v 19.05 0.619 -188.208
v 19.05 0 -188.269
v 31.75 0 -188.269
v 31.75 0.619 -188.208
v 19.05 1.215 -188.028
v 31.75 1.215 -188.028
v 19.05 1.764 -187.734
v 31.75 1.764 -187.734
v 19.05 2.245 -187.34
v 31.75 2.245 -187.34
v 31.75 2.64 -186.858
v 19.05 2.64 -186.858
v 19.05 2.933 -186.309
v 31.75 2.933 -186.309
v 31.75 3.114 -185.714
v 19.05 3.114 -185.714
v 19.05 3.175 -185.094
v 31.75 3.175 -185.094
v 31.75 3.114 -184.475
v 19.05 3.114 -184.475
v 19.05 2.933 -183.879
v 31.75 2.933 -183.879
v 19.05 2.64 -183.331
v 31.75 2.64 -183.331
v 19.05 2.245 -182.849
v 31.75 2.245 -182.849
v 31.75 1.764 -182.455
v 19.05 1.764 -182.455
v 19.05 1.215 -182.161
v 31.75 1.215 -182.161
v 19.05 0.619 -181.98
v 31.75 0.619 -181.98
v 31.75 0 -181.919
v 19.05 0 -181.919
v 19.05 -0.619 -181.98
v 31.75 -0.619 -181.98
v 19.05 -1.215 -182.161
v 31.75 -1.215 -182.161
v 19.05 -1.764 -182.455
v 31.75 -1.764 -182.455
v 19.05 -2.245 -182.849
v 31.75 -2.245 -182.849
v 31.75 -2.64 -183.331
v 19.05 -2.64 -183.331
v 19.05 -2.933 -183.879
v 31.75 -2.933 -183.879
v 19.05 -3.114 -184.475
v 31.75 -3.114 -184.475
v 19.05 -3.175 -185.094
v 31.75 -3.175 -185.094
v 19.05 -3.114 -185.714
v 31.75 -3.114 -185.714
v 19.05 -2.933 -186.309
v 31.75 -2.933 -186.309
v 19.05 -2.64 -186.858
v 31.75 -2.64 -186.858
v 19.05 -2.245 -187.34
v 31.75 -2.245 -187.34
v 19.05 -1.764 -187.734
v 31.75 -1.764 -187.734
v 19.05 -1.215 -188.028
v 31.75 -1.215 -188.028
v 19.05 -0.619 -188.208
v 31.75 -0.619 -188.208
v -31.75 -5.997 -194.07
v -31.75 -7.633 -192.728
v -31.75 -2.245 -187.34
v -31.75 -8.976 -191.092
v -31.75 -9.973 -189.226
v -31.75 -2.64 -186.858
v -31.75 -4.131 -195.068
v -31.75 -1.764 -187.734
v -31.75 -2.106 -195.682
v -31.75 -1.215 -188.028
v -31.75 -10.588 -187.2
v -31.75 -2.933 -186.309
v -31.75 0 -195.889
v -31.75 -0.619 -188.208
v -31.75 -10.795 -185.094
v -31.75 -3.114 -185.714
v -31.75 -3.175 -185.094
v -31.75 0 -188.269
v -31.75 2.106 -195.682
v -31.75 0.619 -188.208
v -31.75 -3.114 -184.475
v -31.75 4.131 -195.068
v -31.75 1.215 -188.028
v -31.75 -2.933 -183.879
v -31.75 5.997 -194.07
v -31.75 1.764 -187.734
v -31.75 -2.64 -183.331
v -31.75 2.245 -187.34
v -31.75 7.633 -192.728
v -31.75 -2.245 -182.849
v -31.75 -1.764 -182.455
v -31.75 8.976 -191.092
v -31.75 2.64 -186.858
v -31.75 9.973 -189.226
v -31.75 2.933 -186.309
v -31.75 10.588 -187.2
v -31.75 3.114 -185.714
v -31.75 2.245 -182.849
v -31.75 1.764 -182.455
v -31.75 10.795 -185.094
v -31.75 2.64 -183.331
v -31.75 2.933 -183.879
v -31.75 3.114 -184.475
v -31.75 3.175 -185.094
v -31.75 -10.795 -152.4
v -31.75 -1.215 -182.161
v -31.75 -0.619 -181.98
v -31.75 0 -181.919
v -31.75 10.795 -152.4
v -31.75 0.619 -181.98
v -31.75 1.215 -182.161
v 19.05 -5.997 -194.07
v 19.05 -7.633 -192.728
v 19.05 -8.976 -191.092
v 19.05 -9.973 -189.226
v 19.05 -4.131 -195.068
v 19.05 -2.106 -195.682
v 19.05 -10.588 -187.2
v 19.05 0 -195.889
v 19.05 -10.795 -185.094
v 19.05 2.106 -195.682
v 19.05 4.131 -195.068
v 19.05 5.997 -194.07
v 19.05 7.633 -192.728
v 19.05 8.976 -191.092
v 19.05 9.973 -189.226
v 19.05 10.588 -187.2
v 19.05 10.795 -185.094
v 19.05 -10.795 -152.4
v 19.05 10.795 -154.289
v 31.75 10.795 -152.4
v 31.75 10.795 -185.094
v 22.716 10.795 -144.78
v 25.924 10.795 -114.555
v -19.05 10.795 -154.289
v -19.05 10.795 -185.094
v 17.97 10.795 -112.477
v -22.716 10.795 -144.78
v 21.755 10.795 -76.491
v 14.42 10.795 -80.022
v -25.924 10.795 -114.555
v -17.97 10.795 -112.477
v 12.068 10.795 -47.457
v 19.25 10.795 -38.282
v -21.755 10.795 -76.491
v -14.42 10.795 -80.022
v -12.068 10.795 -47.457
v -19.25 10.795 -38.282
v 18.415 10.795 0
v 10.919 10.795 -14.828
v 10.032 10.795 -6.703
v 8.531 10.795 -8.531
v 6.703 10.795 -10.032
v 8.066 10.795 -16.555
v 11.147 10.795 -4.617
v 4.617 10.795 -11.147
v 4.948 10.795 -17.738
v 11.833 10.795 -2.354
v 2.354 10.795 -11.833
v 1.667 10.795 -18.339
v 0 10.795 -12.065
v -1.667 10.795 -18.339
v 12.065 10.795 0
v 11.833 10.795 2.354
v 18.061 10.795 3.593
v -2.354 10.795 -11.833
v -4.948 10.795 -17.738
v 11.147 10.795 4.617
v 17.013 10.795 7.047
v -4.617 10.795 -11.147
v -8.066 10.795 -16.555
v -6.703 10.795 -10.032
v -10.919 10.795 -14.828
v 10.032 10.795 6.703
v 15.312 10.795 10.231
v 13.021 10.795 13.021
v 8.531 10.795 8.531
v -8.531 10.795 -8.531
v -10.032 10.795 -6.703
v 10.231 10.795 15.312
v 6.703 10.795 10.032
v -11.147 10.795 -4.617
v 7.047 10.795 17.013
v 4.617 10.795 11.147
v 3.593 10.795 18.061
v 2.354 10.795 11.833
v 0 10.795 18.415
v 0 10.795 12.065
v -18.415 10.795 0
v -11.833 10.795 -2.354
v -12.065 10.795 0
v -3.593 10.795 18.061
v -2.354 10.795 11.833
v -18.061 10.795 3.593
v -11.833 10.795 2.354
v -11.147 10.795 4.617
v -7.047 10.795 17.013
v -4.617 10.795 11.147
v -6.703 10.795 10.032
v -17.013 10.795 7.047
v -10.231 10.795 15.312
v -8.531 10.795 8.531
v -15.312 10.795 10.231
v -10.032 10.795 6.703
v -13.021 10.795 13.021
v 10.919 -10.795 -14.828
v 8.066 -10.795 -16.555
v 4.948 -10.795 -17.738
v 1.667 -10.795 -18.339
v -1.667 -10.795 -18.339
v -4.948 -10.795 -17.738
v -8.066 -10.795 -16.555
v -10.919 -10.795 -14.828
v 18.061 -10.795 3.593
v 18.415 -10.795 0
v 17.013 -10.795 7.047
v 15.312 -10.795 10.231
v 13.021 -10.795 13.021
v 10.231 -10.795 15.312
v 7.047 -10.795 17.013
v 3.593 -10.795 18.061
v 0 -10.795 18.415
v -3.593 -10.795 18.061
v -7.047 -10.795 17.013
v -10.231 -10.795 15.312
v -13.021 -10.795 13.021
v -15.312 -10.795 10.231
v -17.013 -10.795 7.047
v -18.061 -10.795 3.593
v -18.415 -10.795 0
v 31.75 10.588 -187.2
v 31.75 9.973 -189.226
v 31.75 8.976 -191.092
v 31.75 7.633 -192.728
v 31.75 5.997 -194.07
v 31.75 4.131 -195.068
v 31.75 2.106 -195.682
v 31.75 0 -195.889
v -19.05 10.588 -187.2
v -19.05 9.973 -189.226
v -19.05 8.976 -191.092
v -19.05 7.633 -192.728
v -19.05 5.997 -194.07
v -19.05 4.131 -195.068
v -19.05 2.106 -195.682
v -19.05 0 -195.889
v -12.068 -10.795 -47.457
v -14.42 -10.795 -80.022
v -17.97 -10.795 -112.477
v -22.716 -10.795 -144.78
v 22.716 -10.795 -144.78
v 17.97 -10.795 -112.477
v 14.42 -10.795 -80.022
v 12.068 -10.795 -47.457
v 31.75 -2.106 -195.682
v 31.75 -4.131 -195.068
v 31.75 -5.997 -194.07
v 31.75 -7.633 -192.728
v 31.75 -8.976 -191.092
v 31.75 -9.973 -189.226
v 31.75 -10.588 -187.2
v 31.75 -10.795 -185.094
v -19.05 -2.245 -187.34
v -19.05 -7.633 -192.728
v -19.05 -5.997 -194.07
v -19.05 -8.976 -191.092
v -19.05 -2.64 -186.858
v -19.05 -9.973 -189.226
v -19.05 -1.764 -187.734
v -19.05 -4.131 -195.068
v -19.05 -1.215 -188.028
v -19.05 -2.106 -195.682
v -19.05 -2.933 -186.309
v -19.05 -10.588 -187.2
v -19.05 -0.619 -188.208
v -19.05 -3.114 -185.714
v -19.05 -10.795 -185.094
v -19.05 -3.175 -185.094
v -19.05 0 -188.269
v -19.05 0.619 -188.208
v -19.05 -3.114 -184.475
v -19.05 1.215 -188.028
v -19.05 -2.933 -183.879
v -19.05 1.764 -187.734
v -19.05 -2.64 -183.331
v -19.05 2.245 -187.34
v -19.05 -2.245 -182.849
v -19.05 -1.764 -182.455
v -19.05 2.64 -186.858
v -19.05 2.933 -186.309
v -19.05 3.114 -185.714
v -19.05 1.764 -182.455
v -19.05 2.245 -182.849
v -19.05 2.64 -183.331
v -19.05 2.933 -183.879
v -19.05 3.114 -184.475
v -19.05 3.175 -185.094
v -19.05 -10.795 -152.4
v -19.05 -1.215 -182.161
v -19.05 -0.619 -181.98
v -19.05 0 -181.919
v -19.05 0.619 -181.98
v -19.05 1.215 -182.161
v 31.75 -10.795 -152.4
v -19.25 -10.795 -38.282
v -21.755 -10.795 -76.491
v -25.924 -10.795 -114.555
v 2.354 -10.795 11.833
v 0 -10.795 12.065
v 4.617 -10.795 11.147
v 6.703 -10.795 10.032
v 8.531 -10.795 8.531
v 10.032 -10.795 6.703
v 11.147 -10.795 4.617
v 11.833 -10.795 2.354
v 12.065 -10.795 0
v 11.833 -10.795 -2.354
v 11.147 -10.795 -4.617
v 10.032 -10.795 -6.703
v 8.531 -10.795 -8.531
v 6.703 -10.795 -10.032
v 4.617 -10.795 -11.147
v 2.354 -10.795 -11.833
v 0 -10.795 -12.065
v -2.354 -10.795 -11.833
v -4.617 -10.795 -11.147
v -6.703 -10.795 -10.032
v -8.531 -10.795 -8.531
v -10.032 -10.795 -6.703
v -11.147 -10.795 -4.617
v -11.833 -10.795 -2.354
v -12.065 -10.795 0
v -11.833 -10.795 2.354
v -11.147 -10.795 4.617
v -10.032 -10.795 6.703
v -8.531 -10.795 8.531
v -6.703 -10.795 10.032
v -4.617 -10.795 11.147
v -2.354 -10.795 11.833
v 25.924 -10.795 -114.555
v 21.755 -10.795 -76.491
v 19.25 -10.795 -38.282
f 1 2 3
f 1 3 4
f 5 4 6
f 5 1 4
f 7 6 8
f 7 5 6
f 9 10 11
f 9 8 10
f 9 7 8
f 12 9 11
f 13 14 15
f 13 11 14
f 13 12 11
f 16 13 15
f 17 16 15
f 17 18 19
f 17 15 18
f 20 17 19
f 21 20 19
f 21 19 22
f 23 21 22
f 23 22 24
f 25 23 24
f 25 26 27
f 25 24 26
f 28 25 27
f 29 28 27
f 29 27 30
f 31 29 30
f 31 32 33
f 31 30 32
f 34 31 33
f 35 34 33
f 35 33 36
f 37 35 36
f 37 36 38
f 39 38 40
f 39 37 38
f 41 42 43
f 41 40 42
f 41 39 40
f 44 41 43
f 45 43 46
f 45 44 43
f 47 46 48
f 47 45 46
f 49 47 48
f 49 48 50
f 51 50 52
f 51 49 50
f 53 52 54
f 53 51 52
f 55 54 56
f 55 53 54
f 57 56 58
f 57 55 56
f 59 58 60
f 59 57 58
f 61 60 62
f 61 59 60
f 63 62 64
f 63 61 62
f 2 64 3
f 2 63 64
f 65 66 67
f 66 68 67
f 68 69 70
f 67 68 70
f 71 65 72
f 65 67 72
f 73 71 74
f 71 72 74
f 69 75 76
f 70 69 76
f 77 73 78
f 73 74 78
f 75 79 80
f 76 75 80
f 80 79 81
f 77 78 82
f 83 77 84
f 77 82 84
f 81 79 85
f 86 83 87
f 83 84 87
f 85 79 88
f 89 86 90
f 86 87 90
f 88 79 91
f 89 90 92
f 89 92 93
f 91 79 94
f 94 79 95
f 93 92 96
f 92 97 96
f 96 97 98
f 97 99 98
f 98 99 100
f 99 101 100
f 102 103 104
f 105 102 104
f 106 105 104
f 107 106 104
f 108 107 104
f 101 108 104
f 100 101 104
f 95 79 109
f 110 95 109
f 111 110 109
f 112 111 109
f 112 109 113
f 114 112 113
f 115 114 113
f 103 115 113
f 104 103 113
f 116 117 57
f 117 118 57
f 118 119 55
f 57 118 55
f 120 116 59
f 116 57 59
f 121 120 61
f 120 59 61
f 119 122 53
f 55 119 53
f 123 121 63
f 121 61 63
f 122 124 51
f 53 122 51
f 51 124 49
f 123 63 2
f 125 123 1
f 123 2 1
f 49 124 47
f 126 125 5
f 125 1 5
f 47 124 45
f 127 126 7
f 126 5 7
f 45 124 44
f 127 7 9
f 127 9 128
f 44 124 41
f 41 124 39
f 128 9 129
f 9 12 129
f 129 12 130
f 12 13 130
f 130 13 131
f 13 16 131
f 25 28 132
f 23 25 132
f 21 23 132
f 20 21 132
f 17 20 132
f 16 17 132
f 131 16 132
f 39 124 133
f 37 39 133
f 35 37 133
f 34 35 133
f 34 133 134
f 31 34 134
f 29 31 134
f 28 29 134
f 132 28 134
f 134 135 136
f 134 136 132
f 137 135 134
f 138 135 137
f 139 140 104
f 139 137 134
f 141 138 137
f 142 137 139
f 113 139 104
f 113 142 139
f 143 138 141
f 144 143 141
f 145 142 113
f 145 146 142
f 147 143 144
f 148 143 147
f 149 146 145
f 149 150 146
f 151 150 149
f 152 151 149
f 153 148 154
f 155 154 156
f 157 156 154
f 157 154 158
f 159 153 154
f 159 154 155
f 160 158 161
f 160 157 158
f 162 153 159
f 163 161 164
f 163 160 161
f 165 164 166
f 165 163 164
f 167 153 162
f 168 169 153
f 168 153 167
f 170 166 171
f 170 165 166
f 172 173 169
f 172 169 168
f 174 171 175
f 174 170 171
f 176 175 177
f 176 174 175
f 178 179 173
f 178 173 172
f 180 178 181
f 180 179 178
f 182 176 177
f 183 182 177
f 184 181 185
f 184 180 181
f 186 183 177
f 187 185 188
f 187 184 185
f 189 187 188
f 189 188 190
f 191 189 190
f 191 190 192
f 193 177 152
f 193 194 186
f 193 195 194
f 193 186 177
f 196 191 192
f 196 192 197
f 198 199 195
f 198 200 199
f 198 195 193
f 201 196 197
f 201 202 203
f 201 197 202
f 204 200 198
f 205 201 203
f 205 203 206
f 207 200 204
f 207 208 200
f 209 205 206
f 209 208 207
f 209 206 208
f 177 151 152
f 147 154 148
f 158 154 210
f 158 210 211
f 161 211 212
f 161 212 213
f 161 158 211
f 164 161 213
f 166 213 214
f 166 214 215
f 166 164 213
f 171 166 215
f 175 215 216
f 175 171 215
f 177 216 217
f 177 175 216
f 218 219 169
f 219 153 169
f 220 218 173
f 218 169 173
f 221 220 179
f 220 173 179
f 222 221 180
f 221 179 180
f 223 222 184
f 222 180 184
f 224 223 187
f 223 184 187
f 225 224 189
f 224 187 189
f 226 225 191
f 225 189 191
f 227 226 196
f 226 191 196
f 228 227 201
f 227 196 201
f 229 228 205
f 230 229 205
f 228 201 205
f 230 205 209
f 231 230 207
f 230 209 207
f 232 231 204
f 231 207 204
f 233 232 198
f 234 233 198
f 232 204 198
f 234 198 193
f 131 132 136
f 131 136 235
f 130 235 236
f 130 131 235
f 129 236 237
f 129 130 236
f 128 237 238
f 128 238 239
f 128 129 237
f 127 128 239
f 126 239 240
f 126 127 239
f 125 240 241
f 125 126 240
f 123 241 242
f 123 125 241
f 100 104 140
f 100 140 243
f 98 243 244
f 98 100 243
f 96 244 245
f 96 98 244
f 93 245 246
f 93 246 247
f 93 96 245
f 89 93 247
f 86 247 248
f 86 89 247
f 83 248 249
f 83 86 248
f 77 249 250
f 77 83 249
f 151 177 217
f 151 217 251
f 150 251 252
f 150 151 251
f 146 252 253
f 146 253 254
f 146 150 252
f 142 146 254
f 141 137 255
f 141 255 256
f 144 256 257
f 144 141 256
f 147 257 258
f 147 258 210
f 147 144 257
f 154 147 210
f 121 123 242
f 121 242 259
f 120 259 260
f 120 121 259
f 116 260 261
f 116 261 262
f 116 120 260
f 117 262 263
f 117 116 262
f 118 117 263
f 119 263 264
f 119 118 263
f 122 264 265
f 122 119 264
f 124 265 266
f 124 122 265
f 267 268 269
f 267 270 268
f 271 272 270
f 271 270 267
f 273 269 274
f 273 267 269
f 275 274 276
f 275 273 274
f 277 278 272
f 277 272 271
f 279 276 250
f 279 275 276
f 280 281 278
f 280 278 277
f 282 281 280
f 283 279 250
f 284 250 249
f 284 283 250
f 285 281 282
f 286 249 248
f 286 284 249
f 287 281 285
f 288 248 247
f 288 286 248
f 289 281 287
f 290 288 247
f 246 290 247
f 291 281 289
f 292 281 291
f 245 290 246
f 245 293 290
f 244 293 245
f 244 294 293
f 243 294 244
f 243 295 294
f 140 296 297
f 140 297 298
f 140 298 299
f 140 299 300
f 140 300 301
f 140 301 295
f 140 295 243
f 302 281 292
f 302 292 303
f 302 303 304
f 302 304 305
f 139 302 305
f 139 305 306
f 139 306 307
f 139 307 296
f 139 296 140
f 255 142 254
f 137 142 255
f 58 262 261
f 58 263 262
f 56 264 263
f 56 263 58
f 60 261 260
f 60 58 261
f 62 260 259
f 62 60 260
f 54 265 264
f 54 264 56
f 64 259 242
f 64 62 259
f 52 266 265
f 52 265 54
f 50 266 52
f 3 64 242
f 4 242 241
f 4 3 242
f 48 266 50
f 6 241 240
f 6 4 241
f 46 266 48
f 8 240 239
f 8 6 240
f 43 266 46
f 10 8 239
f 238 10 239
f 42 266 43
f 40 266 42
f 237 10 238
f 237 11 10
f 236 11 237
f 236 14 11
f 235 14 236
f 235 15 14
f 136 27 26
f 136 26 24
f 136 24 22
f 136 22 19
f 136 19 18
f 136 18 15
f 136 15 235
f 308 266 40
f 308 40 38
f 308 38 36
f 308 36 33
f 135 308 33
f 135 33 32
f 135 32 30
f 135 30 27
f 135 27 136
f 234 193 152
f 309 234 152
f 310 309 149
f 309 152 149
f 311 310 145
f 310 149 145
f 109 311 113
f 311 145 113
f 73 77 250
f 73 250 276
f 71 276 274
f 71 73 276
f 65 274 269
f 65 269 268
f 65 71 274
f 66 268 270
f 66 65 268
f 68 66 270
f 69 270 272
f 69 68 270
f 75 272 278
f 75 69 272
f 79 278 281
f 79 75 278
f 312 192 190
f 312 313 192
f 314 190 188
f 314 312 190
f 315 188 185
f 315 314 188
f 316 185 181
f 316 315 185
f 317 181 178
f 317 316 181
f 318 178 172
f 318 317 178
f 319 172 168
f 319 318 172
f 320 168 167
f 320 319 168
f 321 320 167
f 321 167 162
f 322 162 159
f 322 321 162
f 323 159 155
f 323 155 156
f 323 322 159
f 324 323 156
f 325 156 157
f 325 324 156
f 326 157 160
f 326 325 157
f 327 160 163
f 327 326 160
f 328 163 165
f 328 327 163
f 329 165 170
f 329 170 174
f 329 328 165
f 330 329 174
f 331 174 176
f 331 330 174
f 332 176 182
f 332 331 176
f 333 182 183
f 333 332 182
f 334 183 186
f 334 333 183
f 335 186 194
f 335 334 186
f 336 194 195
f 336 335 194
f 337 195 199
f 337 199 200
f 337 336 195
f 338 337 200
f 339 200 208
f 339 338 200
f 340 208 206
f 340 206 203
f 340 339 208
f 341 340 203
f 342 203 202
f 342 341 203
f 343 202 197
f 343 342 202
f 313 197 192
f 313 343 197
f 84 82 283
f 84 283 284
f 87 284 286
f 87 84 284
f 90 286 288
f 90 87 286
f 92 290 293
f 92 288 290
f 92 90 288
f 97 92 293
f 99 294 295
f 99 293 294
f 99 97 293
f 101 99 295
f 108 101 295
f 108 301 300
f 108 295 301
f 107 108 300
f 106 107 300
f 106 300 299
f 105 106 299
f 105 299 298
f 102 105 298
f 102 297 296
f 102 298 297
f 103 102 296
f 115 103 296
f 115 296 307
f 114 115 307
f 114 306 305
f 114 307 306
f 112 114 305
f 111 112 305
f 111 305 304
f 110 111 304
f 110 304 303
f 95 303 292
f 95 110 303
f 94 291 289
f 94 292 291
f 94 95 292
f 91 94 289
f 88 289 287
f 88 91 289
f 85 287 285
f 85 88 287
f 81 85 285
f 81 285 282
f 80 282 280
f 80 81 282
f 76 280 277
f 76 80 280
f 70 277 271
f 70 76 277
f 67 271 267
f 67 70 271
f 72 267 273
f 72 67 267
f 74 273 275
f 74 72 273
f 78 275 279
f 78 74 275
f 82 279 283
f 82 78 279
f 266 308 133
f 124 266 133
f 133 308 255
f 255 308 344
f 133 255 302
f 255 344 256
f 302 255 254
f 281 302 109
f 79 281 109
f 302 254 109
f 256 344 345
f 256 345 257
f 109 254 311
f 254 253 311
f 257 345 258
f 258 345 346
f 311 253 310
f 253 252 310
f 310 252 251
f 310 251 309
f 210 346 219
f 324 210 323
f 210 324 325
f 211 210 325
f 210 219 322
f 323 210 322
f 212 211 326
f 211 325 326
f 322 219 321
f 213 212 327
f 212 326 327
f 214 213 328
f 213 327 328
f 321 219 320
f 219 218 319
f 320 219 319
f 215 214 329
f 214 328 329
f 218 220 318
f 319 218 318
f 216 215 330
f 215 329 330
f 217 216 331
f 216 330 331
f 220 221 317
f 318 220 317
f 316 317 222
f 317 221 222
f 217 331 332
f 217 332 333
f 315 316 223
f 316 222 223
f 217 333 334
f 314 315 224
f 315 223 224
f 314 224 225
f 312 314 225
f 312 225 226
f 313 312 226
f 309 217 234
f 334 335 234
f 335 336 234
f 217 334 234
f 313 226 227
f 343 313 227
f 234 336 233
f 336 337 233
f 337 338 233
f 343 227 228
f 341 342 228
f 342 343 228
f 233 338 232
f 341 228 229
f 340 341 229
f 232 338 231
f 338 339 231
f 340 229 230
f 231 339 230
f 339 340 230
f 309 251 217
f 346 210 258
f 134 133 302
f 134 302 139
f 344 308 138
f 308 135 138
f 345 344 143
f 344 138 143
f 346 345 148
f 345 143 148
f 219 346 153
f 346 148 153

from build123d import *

# Parameters (mm, degrees)
SKETCH1_R               = 12.065
BOSS_EXTRUDE1_DEPTH     = 10.795
SKETCH5_W               = 38.1
SKETCH5_H               = 21.59
BOSS_EXTRUDE2_DEPTH     = 101.6
CUT_EXTRUDE1_REACH      = 261.255
SKETCH6_R               = 3.175
SKETCH4_W               = 12.7
SKETCH4_H               = 21.59
BOSS_EXTRUDE3_DEPTH     = 50.8
CUT_EXTRUDE2_DEPTH      = 210.73176208
CUT_EXTRUDE2_DEPTH_BACK = 210.73176208
SKETCH6_2_R             = 3.175
CUT_EXTRUDE3_DEPTH      = 214.164307578
CUT_EXTRUDE3_DEPTH_BACK = 214.164307578
CUT_EXTRUDE4_DEPTH      = 200.616791257
CUT_EXTRUDE4_DEPTH_BACK = 200.616791257


with BuildPart() as part:
    # Sketch1 → Boss-Extrude1 (new, symmetric)
    with BuildSketch(Plane(origin=(0, 0, 0), x_dir=(1, 0, 0), z_dir=(0, 1, 0))):
        with BuildLine():
            Line((-31.75, 152.4), (31.75, 152.4))
            ThreePointArc((31.75, 152.4), (21.755106695, 76.491146914), (18.415, 0))
            ThreePointArc((18.415, 0), (0, -18.415), (-18.415, 0))
            ThreePointArc((-18.415, 0), (-21.755106695, 76.491146914), (-31.75, 152.4))
        make_face()
        Circle(SKETCH1_R, mode=Mode.SUBTRACT)
    extrude(amount=BOSS_EXTRUDE1_DEPTH, both=True)

    # Sketch5 → Boss-Extrude2 (add)
    with BuildSketch(Plane(origin=(0, 0, -152.4), x_dir=(-1, 0, 0), z_dir=(0, 0, -1))):
        Rectangle(SKETCH5_W, SKETCH5_H)
    extrude(amount=BOSS_EXTRUDE2_DEPTH)

    # Sketch6 → Cut-Extrude1 (cut, up to next)
    with BuildSketch(Plane(origin=(19.05, 0, 0), x_dir=(0, 0, -1), z_dir=(1, 0, 0)), mode=Mode.PRIVATE) as cut_extrude1_sk1:
        Polygon((152.4, -10.795), (154.288880246, 10.795), (254, 10.795), (254, -10.795), align=None)
        with Locations((185.094440123, 0)):
            Circle(SKETCH6_R, mode=Mode.SUBTRACT)
    cut_extrude1_tool1 = extrude(cut_extrude1_sk1.sketch, amount=-CUT_EXTRUDE1_REACH, mode=Mode.PRIVATE) & part.part
    add(cut_extrude1_tool1.solids().sort_by_distance((19.05, -0.034262, -203.945458))[0], mode=Mode.SUBTRACT)


with BuildPart() as cut_extrude1_piece_1:
    # of the separate pieces the step leaves, piece 1, a body of its own (cut_extrude1_pieces)
    add(part.part.solids().sort_by_distance((-31.75, -10.795, -152.4))[0])

    # Sketch4 → Boss-Extrude3 (add)
    with BuildSketch(Plane(origin=(0, 0, -152.4), x_dir=(-1, 0, 0), z_dir=(0, 0, -1))):
        with Locations((-25.4, 0)):
            Rectangle(SKETCH4_W, SKETCH4_H)
        with Locations((25.4, 0)):
            Rectangle(SKETCH4_W, SKETCH4_H)
    extrude(amount=BOSS_EXTRUDE3_DEPTH)


with BuildPart() as cut_extrude1_piece_2:
    # of the separate pieces the step leaves, piece 2, a body of its own (cut_extrude1_pieces)
    add(part.part.solids().sort_by_distance((-19.05, 0, -188.269440123))[0])


with BuildPart() as cut_extrude2_tool:
    # Sketch6<2> → Cut-Extrude2 (new, two sides: drawn at the far end of the back side and taken through both)
    with BuildSketch(Plane(origin=(19.05, 0, 0), x_dir=(0, 0, -1), z_dir=(1, 0, 0)).offset(-CUT_EXTRUDE2_DEPTH_BACK)):
        with Locations((185.094440123, 0)):
            Circle(SKETCH6_2_R)
    extrude(amount=CUT_EXTRUDE2_DEPTH + CUT_EXTRUDE2_DEPTH_BACK)


with BuildPart() as cut_extrude1_piece_1_1:
    add(cut_extrude1_piece_1.part)

    # Cut-Extrude2: cut by cut_extrude2_tool
    add(cut_extrude2_tool.part, mode=Mode.SUBTRACT)

    # Sketch7 → Cut-Extrude3 (cut, two sides: drawn at the far end of the back side and taken through both)
    with BuildSketch(Plane(origin=(31.75, 0, 0), x_dir=(0, 0, -1), z_dir=(1, 0, 0)).offset(-CUT_EXTRUDE3_DEPTH_BACK)):
        with BuildLine():
            Line((203.2, 10.795), (185.094440123, 10.795))
            ThreePointArc((185.094440123, 10.795), (192.727657826, 7.633217703), (195.889440123, 0))
            ThreePointArc((195.889440123, 0), (192.727657826, -7.633217703), (185.094440123, -10.795))
            Line((185.094440123, -10.795), (203.2, -10.795))
            Line((203.2, -10.795), (203.2, 10.795))
        make_face()
    extrude(amount=CUT_EXTRUDE3_DEPTH + CUT_EXTRUDE3_DEPTH_BACK, mode=Mode.SUBTRACT)

    # Sketch8 → Cut-Extrude4 (cut, two sides: drawn at the far end of the back side and taken through both)
    with BuildSketch(Plane.XZ.offset(10.795).offset(-CUT_EXTRUDE4_DEPTH_BACK)):
        with BuildLine():
            ThreePointArc((-10.919216068, -14.828450541), (-14.419629325, -80.021900258), (-22.715851164, -144.78))
            Line((-22.715851164, -144.78), (22.715851164, -144.78))
            ThreePointArc((22.715851164, -144.78), (14.419629325, -80.021900258), (10.919216068, -14.828450541))
            ThreePointArc((10.919216068, -14.828450541), (0, -18.415), (-10.919216068, -14.828450541))
        make_face()
    extrude(amount=CUT_EXTRUDE4_DEPTH + CUT_EXTRUDE4_DEPTH_BACK, mode=Mode.SUBTRACT)


with BuildPart() as cut_extrude1_piece_2_1:
    add(cut_extrude1_piece_2.part)

    # Cut-Extrude2: cut by cut_extrude2_tool
    add(cut_extrude2_tool.part, mode=Mode.SUBTRACT)


solid = cut_extrude1_piece_1_1.part
